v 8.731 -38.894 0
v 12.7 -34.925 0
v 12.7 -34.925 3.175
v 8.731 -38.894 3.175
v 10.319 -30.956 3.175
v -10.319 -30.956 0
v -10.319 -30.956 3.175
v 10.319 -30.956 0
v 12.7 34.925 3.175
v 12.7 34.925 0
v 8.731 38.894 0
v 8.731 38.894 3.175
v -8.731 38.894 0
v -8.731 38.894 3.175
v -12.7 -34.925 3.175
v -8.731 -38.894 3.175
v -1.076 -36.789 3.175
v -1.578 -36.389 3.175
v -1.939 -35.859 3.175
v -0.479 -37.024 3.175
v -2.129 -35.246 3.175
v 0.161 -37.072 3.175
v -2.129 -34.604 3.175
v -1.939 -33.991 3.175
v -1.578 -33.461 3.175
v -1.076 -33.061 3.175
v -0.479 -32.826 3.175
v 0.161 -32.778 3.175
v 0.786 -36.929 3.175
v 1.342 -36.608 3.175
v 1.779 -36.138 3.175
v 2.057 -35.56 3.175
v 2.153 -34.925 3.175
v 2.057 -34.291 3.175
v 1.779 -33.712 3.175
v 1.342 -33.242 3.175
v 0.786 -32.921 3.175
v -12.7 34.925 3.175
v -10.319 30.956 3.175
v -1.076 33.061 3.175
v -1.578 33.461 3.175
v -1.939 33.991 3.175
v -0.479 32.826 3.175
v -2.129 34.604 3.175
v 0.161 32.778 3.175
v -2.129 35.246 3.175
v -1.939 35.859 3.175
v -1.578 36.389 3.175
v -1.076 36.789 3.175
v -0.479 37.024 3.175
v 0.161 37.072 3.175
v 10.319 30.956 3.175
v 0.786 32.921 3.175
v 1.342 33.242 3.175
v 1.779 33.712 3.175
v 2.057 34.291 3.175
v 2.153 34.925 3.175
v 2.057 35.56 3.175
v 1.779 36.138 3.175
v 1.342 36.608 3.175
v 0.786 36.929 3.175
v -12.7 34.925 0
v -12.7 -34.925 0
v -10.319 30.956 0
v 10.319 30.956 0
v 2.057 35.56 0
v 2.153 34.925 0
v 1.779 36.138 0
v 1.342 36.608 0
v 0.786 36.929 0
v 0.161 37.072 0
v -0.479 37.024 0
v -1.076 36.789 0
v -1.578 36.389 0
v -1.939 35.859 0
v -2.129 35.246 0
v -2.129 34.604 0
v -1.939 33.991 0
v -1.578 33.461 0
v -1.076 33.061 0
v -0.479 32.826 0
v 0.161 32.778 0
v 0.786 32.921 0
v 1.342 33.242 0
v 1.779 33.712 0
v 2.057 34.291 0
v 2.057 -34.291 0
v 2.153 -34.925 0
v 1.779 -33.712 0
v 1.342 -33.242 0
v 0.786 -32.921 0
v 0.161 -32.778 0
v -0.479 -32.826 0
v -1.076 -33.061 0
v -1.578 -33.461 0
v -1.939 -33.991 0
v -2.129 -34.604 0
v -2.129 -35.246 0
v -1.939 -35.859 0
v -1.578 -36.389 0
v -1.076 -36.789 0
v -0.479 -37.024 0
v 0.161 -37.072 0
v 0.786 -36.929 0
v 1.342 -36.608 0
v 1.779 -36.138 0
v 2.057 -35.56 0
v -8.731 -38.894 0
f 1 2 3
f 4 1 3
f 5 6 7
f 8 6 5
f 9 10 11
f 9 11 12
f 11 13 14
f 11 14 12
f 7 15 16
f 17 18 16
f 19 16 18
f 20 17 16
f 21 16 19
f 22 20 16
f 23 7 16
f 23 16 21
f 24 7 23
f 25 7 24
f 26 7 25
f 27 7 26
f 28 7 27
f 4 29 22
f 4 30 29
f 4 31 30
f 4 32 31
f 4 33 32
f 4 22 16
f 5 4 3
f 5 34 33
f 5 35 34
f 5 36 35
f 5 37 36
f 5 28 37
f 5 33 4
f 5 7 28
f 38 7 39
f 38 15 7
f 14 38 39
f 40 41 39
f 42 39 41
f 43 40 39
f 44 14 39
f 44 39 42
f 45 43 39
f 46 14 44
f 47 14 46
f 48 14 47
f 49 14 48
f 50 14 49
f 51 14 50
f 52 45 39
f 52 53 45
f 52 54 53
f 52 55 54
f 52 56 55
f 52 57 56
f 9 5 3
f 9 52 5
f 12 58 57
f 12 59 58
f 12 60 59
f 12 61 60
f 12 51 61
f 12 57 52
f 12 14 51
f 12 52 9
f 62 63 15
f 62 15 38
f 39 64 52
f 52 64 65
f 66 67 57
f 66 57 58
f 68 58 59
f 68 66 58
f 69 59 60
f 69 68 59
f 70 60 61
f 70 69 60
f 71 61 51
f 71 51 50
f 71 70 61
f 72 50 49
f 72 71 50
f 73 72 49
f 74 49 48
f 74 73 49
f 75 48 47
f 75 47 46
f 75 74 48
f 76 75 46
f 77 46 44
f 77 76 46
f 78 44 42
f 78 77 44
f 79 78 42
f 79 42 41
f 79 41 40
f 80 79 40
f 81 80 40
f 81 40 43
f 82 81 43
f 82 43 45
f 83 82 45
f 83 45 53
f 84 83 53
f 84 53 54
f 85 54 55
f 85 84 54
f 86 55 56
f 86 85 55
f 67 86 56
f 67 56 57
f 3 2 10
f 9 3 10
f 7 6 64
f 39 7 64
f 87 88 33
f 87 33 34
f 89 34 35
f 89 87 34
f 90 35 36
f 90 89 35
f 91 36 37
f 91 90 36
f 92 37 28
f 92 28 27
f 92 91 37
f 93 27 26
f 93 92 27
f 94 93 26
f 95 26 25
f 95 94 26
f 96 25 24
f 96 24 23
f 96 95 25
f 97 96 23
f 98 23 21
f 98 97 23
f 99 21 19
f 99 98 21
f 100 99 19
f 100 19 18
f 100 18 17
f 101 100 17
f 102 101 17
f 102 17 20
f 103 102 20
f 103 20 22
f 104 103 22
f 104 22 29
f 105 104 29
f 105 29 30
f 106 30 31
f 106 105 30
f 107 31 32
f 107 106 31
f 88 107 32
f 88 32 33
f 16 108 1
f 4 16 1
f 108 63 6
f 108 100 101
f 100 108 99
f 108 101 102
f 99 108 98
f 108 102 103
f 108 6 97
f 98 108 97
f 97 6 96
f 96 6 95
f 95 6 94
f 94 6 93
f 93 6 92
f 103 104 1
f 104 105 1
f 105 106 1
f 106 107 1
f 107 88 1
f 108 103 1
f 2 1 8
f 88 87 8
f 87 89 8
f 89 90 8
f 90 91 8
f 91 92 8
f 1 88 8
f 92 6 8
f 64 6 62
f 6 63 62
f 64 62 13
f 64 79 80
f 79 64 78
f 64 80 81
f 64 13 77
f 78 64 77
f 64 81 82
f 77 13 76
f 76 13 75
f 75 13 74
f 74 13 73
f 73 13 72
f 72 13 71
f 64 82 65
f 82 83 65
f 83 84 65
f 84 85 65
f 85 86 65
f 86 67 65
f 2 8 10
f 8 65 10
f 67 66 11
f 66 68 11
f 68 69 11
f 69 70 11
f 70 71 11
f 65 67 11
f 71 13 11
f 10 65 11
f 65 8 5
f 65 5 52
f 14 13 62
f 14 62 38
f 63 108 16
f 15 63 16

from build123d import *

# Parameters (mm, degrees)
F0_W     = 25.4
F0_H     = 77.787526
F0_R     = 2.15265
F0_W_2   = 20.6375
F0_H_2   = 61.912526
F1_DEPTH = 3.175
F2_SIZE  = 3.96875


with BuildPart() as f1:
    # F0 (on Top) → F1 (new body)
    with BuildSketch(Plane.XY):
        Rectangle(F0_W, F0_H)
        with Locations((0, -34.925013)):
            Circle(F0_R, mode=Mode.SUBTRACT)
        Rectangle(F0_W_2, F0_H_2, mode=Mode.SUBTRACT)
        with Locations((0, 34.925013)):
            Circle(F0_R, mode=Mode.SUBTRACT)
    extrude(amount=F1_DEPTH)

    # F2
    f2_edges = [f1.edges().sort_by_distance(p)[0] for p in [
        (-12.7, -38.893763, 1.5875),
        (12.7, -38.893763, 1.5875),
        (12.7, 38.893763, 1.5875),
        (-12.7, 38.893763, 1.5875),
    ]]
    chamfer(f2_edges, length=F2_SIZE)


solid = f1.part
